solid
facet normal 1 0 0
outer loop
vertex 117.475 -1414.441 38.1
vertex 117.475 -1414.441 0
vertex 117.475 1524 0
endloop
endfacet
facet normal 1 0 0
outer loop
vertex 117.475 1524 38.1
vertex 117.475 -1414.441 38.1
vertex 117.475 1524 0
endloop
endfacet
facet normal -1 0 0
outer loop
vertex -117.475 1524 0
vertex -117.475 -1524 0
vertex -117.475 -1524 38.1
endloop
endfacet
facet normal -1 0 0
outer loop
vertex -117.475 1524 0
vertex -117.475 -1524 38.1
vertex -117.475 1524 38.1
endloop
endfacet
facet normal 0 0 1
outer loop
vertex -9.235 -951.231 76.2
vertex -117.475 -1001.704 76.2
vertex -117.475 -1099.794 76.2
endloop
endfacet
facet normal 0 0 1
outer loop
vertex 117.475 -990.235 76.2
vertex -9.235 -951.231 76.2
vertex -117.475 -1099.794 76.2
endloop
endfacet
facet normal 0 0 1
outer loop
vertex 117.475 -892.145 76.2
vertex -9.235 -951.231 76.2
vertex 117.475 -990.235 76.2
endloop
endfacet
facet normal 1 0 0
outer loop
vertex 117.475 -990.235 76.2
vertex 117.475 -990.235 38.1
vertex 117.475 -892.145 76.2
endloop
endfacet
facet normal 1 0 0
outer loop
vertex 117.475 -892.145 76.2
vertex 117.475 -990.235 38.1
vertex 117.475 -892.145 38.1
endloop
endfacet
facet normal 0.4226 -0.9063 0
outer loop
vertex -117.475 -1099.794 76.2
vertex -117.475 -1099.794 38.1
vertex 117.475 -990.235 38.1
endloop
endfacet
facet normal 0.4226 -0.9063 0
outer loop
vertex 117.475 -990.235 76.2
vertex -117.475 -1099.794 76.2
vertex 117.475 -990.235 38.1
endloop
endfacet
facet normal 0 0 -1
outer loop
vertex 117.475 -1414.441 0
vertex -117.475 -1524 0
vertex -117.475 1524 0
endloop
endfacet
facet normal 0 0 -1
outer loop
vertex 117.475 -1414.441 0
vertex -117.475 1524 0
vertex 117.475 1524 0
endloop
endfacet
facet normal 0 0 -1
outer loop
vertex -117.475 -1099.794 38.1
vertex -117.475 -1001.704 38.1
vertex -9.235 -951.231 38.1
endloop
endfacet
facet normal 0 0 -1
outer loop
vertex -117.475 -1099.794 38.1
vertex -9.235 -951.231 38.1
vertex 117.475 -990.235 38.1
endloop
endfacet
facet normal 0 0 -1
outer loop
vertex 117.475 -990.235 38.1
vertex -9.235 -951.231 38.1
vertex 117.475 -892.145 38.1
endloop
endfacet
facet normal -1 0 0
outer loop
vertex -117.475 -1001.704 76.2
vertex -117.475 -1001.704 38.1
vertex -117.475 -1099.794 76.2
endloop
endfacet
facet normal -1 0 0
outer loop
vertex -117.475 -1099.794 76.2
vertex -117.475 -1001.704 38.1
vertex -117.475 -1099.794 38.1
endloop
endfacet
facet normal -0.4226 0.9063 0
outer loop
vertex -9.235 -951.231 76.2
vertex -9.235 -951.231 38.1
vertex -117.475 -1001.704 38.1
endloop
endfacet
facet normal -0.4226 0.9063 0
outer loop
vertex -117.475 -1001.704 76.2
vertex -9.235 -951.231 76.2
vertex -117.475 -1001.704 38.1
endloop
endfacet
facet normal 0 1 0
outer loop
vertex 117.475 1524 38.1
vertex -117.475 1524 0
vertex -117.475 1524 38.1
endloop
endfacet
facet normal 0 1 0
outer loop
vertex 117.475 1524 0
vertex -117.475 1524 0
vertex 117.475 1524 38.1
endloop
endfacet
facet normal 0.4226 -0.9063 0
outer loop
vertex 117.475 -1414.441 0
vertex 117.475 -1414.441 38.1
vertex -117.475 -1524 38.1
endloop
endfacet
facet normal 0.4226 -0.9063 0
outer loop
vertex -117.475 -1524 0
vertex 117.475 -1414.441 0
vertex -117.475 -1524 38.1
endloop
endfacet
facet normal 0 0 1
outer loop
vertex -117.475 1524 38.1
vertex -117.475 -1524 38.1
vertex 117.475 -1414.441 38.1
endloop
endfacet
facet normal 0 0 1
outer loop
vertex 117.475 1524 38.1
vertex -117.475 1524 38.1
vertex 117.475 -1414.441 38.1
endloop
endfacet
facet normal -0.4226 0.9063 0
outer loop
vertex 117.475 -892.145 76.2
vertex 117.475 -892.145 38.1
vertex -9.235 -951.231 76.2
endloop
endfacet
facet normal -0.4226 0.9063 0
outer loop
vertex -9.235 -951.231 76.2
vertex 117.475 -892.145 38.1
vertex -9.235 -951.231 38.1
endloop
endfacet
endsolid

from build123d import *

# Parameters (mm, degrees)
F1_W     = 234.95
F1_H     = 3048
F2_DEPTH = 38.1
F4_DEPTH = 38.1
F6_DEPTH = 38.1


with BuildPart() as f2:
    # F1 (on Top) → F2 (new body)
    with BuildSketch(Plane.XY):
        Rectangle(F1_W, F1_H)
    extrude(amount=F2_DEPTH)

    # F3 (on face) → F4 (cut, through all)
    with BuildSketch(Plane.XY.offset(38.1)):
        Polygon((117.475, -1414.4410157165), (-117.475, -1524), (117.475, -1524), align=None)
    extrude(amount=-F4_DEPTH, mode=Mode.SUBTRACT)


with BuildPart() as f6:
    # F5 (on face) → F6 (new body)
    with BuildSketch(Plane.XY.offset(38.1)):
        Polygon((-117.475, -1001.7037331937), (-117.475, -1099.7940301895), (28.3354210442, -1031.8015142178), (-9.2353424246, -951.2307519503), align=None)
        Polygon((-9.2353424246, -951.2307519503), (28.3354210442, -1031.8015142178), (117.475, -990.235045906), (117.475, -892.1447489102), align=None)
    extrude(amount=F6_DEPTH)


solid = Compound([f2.part, f6.part])
